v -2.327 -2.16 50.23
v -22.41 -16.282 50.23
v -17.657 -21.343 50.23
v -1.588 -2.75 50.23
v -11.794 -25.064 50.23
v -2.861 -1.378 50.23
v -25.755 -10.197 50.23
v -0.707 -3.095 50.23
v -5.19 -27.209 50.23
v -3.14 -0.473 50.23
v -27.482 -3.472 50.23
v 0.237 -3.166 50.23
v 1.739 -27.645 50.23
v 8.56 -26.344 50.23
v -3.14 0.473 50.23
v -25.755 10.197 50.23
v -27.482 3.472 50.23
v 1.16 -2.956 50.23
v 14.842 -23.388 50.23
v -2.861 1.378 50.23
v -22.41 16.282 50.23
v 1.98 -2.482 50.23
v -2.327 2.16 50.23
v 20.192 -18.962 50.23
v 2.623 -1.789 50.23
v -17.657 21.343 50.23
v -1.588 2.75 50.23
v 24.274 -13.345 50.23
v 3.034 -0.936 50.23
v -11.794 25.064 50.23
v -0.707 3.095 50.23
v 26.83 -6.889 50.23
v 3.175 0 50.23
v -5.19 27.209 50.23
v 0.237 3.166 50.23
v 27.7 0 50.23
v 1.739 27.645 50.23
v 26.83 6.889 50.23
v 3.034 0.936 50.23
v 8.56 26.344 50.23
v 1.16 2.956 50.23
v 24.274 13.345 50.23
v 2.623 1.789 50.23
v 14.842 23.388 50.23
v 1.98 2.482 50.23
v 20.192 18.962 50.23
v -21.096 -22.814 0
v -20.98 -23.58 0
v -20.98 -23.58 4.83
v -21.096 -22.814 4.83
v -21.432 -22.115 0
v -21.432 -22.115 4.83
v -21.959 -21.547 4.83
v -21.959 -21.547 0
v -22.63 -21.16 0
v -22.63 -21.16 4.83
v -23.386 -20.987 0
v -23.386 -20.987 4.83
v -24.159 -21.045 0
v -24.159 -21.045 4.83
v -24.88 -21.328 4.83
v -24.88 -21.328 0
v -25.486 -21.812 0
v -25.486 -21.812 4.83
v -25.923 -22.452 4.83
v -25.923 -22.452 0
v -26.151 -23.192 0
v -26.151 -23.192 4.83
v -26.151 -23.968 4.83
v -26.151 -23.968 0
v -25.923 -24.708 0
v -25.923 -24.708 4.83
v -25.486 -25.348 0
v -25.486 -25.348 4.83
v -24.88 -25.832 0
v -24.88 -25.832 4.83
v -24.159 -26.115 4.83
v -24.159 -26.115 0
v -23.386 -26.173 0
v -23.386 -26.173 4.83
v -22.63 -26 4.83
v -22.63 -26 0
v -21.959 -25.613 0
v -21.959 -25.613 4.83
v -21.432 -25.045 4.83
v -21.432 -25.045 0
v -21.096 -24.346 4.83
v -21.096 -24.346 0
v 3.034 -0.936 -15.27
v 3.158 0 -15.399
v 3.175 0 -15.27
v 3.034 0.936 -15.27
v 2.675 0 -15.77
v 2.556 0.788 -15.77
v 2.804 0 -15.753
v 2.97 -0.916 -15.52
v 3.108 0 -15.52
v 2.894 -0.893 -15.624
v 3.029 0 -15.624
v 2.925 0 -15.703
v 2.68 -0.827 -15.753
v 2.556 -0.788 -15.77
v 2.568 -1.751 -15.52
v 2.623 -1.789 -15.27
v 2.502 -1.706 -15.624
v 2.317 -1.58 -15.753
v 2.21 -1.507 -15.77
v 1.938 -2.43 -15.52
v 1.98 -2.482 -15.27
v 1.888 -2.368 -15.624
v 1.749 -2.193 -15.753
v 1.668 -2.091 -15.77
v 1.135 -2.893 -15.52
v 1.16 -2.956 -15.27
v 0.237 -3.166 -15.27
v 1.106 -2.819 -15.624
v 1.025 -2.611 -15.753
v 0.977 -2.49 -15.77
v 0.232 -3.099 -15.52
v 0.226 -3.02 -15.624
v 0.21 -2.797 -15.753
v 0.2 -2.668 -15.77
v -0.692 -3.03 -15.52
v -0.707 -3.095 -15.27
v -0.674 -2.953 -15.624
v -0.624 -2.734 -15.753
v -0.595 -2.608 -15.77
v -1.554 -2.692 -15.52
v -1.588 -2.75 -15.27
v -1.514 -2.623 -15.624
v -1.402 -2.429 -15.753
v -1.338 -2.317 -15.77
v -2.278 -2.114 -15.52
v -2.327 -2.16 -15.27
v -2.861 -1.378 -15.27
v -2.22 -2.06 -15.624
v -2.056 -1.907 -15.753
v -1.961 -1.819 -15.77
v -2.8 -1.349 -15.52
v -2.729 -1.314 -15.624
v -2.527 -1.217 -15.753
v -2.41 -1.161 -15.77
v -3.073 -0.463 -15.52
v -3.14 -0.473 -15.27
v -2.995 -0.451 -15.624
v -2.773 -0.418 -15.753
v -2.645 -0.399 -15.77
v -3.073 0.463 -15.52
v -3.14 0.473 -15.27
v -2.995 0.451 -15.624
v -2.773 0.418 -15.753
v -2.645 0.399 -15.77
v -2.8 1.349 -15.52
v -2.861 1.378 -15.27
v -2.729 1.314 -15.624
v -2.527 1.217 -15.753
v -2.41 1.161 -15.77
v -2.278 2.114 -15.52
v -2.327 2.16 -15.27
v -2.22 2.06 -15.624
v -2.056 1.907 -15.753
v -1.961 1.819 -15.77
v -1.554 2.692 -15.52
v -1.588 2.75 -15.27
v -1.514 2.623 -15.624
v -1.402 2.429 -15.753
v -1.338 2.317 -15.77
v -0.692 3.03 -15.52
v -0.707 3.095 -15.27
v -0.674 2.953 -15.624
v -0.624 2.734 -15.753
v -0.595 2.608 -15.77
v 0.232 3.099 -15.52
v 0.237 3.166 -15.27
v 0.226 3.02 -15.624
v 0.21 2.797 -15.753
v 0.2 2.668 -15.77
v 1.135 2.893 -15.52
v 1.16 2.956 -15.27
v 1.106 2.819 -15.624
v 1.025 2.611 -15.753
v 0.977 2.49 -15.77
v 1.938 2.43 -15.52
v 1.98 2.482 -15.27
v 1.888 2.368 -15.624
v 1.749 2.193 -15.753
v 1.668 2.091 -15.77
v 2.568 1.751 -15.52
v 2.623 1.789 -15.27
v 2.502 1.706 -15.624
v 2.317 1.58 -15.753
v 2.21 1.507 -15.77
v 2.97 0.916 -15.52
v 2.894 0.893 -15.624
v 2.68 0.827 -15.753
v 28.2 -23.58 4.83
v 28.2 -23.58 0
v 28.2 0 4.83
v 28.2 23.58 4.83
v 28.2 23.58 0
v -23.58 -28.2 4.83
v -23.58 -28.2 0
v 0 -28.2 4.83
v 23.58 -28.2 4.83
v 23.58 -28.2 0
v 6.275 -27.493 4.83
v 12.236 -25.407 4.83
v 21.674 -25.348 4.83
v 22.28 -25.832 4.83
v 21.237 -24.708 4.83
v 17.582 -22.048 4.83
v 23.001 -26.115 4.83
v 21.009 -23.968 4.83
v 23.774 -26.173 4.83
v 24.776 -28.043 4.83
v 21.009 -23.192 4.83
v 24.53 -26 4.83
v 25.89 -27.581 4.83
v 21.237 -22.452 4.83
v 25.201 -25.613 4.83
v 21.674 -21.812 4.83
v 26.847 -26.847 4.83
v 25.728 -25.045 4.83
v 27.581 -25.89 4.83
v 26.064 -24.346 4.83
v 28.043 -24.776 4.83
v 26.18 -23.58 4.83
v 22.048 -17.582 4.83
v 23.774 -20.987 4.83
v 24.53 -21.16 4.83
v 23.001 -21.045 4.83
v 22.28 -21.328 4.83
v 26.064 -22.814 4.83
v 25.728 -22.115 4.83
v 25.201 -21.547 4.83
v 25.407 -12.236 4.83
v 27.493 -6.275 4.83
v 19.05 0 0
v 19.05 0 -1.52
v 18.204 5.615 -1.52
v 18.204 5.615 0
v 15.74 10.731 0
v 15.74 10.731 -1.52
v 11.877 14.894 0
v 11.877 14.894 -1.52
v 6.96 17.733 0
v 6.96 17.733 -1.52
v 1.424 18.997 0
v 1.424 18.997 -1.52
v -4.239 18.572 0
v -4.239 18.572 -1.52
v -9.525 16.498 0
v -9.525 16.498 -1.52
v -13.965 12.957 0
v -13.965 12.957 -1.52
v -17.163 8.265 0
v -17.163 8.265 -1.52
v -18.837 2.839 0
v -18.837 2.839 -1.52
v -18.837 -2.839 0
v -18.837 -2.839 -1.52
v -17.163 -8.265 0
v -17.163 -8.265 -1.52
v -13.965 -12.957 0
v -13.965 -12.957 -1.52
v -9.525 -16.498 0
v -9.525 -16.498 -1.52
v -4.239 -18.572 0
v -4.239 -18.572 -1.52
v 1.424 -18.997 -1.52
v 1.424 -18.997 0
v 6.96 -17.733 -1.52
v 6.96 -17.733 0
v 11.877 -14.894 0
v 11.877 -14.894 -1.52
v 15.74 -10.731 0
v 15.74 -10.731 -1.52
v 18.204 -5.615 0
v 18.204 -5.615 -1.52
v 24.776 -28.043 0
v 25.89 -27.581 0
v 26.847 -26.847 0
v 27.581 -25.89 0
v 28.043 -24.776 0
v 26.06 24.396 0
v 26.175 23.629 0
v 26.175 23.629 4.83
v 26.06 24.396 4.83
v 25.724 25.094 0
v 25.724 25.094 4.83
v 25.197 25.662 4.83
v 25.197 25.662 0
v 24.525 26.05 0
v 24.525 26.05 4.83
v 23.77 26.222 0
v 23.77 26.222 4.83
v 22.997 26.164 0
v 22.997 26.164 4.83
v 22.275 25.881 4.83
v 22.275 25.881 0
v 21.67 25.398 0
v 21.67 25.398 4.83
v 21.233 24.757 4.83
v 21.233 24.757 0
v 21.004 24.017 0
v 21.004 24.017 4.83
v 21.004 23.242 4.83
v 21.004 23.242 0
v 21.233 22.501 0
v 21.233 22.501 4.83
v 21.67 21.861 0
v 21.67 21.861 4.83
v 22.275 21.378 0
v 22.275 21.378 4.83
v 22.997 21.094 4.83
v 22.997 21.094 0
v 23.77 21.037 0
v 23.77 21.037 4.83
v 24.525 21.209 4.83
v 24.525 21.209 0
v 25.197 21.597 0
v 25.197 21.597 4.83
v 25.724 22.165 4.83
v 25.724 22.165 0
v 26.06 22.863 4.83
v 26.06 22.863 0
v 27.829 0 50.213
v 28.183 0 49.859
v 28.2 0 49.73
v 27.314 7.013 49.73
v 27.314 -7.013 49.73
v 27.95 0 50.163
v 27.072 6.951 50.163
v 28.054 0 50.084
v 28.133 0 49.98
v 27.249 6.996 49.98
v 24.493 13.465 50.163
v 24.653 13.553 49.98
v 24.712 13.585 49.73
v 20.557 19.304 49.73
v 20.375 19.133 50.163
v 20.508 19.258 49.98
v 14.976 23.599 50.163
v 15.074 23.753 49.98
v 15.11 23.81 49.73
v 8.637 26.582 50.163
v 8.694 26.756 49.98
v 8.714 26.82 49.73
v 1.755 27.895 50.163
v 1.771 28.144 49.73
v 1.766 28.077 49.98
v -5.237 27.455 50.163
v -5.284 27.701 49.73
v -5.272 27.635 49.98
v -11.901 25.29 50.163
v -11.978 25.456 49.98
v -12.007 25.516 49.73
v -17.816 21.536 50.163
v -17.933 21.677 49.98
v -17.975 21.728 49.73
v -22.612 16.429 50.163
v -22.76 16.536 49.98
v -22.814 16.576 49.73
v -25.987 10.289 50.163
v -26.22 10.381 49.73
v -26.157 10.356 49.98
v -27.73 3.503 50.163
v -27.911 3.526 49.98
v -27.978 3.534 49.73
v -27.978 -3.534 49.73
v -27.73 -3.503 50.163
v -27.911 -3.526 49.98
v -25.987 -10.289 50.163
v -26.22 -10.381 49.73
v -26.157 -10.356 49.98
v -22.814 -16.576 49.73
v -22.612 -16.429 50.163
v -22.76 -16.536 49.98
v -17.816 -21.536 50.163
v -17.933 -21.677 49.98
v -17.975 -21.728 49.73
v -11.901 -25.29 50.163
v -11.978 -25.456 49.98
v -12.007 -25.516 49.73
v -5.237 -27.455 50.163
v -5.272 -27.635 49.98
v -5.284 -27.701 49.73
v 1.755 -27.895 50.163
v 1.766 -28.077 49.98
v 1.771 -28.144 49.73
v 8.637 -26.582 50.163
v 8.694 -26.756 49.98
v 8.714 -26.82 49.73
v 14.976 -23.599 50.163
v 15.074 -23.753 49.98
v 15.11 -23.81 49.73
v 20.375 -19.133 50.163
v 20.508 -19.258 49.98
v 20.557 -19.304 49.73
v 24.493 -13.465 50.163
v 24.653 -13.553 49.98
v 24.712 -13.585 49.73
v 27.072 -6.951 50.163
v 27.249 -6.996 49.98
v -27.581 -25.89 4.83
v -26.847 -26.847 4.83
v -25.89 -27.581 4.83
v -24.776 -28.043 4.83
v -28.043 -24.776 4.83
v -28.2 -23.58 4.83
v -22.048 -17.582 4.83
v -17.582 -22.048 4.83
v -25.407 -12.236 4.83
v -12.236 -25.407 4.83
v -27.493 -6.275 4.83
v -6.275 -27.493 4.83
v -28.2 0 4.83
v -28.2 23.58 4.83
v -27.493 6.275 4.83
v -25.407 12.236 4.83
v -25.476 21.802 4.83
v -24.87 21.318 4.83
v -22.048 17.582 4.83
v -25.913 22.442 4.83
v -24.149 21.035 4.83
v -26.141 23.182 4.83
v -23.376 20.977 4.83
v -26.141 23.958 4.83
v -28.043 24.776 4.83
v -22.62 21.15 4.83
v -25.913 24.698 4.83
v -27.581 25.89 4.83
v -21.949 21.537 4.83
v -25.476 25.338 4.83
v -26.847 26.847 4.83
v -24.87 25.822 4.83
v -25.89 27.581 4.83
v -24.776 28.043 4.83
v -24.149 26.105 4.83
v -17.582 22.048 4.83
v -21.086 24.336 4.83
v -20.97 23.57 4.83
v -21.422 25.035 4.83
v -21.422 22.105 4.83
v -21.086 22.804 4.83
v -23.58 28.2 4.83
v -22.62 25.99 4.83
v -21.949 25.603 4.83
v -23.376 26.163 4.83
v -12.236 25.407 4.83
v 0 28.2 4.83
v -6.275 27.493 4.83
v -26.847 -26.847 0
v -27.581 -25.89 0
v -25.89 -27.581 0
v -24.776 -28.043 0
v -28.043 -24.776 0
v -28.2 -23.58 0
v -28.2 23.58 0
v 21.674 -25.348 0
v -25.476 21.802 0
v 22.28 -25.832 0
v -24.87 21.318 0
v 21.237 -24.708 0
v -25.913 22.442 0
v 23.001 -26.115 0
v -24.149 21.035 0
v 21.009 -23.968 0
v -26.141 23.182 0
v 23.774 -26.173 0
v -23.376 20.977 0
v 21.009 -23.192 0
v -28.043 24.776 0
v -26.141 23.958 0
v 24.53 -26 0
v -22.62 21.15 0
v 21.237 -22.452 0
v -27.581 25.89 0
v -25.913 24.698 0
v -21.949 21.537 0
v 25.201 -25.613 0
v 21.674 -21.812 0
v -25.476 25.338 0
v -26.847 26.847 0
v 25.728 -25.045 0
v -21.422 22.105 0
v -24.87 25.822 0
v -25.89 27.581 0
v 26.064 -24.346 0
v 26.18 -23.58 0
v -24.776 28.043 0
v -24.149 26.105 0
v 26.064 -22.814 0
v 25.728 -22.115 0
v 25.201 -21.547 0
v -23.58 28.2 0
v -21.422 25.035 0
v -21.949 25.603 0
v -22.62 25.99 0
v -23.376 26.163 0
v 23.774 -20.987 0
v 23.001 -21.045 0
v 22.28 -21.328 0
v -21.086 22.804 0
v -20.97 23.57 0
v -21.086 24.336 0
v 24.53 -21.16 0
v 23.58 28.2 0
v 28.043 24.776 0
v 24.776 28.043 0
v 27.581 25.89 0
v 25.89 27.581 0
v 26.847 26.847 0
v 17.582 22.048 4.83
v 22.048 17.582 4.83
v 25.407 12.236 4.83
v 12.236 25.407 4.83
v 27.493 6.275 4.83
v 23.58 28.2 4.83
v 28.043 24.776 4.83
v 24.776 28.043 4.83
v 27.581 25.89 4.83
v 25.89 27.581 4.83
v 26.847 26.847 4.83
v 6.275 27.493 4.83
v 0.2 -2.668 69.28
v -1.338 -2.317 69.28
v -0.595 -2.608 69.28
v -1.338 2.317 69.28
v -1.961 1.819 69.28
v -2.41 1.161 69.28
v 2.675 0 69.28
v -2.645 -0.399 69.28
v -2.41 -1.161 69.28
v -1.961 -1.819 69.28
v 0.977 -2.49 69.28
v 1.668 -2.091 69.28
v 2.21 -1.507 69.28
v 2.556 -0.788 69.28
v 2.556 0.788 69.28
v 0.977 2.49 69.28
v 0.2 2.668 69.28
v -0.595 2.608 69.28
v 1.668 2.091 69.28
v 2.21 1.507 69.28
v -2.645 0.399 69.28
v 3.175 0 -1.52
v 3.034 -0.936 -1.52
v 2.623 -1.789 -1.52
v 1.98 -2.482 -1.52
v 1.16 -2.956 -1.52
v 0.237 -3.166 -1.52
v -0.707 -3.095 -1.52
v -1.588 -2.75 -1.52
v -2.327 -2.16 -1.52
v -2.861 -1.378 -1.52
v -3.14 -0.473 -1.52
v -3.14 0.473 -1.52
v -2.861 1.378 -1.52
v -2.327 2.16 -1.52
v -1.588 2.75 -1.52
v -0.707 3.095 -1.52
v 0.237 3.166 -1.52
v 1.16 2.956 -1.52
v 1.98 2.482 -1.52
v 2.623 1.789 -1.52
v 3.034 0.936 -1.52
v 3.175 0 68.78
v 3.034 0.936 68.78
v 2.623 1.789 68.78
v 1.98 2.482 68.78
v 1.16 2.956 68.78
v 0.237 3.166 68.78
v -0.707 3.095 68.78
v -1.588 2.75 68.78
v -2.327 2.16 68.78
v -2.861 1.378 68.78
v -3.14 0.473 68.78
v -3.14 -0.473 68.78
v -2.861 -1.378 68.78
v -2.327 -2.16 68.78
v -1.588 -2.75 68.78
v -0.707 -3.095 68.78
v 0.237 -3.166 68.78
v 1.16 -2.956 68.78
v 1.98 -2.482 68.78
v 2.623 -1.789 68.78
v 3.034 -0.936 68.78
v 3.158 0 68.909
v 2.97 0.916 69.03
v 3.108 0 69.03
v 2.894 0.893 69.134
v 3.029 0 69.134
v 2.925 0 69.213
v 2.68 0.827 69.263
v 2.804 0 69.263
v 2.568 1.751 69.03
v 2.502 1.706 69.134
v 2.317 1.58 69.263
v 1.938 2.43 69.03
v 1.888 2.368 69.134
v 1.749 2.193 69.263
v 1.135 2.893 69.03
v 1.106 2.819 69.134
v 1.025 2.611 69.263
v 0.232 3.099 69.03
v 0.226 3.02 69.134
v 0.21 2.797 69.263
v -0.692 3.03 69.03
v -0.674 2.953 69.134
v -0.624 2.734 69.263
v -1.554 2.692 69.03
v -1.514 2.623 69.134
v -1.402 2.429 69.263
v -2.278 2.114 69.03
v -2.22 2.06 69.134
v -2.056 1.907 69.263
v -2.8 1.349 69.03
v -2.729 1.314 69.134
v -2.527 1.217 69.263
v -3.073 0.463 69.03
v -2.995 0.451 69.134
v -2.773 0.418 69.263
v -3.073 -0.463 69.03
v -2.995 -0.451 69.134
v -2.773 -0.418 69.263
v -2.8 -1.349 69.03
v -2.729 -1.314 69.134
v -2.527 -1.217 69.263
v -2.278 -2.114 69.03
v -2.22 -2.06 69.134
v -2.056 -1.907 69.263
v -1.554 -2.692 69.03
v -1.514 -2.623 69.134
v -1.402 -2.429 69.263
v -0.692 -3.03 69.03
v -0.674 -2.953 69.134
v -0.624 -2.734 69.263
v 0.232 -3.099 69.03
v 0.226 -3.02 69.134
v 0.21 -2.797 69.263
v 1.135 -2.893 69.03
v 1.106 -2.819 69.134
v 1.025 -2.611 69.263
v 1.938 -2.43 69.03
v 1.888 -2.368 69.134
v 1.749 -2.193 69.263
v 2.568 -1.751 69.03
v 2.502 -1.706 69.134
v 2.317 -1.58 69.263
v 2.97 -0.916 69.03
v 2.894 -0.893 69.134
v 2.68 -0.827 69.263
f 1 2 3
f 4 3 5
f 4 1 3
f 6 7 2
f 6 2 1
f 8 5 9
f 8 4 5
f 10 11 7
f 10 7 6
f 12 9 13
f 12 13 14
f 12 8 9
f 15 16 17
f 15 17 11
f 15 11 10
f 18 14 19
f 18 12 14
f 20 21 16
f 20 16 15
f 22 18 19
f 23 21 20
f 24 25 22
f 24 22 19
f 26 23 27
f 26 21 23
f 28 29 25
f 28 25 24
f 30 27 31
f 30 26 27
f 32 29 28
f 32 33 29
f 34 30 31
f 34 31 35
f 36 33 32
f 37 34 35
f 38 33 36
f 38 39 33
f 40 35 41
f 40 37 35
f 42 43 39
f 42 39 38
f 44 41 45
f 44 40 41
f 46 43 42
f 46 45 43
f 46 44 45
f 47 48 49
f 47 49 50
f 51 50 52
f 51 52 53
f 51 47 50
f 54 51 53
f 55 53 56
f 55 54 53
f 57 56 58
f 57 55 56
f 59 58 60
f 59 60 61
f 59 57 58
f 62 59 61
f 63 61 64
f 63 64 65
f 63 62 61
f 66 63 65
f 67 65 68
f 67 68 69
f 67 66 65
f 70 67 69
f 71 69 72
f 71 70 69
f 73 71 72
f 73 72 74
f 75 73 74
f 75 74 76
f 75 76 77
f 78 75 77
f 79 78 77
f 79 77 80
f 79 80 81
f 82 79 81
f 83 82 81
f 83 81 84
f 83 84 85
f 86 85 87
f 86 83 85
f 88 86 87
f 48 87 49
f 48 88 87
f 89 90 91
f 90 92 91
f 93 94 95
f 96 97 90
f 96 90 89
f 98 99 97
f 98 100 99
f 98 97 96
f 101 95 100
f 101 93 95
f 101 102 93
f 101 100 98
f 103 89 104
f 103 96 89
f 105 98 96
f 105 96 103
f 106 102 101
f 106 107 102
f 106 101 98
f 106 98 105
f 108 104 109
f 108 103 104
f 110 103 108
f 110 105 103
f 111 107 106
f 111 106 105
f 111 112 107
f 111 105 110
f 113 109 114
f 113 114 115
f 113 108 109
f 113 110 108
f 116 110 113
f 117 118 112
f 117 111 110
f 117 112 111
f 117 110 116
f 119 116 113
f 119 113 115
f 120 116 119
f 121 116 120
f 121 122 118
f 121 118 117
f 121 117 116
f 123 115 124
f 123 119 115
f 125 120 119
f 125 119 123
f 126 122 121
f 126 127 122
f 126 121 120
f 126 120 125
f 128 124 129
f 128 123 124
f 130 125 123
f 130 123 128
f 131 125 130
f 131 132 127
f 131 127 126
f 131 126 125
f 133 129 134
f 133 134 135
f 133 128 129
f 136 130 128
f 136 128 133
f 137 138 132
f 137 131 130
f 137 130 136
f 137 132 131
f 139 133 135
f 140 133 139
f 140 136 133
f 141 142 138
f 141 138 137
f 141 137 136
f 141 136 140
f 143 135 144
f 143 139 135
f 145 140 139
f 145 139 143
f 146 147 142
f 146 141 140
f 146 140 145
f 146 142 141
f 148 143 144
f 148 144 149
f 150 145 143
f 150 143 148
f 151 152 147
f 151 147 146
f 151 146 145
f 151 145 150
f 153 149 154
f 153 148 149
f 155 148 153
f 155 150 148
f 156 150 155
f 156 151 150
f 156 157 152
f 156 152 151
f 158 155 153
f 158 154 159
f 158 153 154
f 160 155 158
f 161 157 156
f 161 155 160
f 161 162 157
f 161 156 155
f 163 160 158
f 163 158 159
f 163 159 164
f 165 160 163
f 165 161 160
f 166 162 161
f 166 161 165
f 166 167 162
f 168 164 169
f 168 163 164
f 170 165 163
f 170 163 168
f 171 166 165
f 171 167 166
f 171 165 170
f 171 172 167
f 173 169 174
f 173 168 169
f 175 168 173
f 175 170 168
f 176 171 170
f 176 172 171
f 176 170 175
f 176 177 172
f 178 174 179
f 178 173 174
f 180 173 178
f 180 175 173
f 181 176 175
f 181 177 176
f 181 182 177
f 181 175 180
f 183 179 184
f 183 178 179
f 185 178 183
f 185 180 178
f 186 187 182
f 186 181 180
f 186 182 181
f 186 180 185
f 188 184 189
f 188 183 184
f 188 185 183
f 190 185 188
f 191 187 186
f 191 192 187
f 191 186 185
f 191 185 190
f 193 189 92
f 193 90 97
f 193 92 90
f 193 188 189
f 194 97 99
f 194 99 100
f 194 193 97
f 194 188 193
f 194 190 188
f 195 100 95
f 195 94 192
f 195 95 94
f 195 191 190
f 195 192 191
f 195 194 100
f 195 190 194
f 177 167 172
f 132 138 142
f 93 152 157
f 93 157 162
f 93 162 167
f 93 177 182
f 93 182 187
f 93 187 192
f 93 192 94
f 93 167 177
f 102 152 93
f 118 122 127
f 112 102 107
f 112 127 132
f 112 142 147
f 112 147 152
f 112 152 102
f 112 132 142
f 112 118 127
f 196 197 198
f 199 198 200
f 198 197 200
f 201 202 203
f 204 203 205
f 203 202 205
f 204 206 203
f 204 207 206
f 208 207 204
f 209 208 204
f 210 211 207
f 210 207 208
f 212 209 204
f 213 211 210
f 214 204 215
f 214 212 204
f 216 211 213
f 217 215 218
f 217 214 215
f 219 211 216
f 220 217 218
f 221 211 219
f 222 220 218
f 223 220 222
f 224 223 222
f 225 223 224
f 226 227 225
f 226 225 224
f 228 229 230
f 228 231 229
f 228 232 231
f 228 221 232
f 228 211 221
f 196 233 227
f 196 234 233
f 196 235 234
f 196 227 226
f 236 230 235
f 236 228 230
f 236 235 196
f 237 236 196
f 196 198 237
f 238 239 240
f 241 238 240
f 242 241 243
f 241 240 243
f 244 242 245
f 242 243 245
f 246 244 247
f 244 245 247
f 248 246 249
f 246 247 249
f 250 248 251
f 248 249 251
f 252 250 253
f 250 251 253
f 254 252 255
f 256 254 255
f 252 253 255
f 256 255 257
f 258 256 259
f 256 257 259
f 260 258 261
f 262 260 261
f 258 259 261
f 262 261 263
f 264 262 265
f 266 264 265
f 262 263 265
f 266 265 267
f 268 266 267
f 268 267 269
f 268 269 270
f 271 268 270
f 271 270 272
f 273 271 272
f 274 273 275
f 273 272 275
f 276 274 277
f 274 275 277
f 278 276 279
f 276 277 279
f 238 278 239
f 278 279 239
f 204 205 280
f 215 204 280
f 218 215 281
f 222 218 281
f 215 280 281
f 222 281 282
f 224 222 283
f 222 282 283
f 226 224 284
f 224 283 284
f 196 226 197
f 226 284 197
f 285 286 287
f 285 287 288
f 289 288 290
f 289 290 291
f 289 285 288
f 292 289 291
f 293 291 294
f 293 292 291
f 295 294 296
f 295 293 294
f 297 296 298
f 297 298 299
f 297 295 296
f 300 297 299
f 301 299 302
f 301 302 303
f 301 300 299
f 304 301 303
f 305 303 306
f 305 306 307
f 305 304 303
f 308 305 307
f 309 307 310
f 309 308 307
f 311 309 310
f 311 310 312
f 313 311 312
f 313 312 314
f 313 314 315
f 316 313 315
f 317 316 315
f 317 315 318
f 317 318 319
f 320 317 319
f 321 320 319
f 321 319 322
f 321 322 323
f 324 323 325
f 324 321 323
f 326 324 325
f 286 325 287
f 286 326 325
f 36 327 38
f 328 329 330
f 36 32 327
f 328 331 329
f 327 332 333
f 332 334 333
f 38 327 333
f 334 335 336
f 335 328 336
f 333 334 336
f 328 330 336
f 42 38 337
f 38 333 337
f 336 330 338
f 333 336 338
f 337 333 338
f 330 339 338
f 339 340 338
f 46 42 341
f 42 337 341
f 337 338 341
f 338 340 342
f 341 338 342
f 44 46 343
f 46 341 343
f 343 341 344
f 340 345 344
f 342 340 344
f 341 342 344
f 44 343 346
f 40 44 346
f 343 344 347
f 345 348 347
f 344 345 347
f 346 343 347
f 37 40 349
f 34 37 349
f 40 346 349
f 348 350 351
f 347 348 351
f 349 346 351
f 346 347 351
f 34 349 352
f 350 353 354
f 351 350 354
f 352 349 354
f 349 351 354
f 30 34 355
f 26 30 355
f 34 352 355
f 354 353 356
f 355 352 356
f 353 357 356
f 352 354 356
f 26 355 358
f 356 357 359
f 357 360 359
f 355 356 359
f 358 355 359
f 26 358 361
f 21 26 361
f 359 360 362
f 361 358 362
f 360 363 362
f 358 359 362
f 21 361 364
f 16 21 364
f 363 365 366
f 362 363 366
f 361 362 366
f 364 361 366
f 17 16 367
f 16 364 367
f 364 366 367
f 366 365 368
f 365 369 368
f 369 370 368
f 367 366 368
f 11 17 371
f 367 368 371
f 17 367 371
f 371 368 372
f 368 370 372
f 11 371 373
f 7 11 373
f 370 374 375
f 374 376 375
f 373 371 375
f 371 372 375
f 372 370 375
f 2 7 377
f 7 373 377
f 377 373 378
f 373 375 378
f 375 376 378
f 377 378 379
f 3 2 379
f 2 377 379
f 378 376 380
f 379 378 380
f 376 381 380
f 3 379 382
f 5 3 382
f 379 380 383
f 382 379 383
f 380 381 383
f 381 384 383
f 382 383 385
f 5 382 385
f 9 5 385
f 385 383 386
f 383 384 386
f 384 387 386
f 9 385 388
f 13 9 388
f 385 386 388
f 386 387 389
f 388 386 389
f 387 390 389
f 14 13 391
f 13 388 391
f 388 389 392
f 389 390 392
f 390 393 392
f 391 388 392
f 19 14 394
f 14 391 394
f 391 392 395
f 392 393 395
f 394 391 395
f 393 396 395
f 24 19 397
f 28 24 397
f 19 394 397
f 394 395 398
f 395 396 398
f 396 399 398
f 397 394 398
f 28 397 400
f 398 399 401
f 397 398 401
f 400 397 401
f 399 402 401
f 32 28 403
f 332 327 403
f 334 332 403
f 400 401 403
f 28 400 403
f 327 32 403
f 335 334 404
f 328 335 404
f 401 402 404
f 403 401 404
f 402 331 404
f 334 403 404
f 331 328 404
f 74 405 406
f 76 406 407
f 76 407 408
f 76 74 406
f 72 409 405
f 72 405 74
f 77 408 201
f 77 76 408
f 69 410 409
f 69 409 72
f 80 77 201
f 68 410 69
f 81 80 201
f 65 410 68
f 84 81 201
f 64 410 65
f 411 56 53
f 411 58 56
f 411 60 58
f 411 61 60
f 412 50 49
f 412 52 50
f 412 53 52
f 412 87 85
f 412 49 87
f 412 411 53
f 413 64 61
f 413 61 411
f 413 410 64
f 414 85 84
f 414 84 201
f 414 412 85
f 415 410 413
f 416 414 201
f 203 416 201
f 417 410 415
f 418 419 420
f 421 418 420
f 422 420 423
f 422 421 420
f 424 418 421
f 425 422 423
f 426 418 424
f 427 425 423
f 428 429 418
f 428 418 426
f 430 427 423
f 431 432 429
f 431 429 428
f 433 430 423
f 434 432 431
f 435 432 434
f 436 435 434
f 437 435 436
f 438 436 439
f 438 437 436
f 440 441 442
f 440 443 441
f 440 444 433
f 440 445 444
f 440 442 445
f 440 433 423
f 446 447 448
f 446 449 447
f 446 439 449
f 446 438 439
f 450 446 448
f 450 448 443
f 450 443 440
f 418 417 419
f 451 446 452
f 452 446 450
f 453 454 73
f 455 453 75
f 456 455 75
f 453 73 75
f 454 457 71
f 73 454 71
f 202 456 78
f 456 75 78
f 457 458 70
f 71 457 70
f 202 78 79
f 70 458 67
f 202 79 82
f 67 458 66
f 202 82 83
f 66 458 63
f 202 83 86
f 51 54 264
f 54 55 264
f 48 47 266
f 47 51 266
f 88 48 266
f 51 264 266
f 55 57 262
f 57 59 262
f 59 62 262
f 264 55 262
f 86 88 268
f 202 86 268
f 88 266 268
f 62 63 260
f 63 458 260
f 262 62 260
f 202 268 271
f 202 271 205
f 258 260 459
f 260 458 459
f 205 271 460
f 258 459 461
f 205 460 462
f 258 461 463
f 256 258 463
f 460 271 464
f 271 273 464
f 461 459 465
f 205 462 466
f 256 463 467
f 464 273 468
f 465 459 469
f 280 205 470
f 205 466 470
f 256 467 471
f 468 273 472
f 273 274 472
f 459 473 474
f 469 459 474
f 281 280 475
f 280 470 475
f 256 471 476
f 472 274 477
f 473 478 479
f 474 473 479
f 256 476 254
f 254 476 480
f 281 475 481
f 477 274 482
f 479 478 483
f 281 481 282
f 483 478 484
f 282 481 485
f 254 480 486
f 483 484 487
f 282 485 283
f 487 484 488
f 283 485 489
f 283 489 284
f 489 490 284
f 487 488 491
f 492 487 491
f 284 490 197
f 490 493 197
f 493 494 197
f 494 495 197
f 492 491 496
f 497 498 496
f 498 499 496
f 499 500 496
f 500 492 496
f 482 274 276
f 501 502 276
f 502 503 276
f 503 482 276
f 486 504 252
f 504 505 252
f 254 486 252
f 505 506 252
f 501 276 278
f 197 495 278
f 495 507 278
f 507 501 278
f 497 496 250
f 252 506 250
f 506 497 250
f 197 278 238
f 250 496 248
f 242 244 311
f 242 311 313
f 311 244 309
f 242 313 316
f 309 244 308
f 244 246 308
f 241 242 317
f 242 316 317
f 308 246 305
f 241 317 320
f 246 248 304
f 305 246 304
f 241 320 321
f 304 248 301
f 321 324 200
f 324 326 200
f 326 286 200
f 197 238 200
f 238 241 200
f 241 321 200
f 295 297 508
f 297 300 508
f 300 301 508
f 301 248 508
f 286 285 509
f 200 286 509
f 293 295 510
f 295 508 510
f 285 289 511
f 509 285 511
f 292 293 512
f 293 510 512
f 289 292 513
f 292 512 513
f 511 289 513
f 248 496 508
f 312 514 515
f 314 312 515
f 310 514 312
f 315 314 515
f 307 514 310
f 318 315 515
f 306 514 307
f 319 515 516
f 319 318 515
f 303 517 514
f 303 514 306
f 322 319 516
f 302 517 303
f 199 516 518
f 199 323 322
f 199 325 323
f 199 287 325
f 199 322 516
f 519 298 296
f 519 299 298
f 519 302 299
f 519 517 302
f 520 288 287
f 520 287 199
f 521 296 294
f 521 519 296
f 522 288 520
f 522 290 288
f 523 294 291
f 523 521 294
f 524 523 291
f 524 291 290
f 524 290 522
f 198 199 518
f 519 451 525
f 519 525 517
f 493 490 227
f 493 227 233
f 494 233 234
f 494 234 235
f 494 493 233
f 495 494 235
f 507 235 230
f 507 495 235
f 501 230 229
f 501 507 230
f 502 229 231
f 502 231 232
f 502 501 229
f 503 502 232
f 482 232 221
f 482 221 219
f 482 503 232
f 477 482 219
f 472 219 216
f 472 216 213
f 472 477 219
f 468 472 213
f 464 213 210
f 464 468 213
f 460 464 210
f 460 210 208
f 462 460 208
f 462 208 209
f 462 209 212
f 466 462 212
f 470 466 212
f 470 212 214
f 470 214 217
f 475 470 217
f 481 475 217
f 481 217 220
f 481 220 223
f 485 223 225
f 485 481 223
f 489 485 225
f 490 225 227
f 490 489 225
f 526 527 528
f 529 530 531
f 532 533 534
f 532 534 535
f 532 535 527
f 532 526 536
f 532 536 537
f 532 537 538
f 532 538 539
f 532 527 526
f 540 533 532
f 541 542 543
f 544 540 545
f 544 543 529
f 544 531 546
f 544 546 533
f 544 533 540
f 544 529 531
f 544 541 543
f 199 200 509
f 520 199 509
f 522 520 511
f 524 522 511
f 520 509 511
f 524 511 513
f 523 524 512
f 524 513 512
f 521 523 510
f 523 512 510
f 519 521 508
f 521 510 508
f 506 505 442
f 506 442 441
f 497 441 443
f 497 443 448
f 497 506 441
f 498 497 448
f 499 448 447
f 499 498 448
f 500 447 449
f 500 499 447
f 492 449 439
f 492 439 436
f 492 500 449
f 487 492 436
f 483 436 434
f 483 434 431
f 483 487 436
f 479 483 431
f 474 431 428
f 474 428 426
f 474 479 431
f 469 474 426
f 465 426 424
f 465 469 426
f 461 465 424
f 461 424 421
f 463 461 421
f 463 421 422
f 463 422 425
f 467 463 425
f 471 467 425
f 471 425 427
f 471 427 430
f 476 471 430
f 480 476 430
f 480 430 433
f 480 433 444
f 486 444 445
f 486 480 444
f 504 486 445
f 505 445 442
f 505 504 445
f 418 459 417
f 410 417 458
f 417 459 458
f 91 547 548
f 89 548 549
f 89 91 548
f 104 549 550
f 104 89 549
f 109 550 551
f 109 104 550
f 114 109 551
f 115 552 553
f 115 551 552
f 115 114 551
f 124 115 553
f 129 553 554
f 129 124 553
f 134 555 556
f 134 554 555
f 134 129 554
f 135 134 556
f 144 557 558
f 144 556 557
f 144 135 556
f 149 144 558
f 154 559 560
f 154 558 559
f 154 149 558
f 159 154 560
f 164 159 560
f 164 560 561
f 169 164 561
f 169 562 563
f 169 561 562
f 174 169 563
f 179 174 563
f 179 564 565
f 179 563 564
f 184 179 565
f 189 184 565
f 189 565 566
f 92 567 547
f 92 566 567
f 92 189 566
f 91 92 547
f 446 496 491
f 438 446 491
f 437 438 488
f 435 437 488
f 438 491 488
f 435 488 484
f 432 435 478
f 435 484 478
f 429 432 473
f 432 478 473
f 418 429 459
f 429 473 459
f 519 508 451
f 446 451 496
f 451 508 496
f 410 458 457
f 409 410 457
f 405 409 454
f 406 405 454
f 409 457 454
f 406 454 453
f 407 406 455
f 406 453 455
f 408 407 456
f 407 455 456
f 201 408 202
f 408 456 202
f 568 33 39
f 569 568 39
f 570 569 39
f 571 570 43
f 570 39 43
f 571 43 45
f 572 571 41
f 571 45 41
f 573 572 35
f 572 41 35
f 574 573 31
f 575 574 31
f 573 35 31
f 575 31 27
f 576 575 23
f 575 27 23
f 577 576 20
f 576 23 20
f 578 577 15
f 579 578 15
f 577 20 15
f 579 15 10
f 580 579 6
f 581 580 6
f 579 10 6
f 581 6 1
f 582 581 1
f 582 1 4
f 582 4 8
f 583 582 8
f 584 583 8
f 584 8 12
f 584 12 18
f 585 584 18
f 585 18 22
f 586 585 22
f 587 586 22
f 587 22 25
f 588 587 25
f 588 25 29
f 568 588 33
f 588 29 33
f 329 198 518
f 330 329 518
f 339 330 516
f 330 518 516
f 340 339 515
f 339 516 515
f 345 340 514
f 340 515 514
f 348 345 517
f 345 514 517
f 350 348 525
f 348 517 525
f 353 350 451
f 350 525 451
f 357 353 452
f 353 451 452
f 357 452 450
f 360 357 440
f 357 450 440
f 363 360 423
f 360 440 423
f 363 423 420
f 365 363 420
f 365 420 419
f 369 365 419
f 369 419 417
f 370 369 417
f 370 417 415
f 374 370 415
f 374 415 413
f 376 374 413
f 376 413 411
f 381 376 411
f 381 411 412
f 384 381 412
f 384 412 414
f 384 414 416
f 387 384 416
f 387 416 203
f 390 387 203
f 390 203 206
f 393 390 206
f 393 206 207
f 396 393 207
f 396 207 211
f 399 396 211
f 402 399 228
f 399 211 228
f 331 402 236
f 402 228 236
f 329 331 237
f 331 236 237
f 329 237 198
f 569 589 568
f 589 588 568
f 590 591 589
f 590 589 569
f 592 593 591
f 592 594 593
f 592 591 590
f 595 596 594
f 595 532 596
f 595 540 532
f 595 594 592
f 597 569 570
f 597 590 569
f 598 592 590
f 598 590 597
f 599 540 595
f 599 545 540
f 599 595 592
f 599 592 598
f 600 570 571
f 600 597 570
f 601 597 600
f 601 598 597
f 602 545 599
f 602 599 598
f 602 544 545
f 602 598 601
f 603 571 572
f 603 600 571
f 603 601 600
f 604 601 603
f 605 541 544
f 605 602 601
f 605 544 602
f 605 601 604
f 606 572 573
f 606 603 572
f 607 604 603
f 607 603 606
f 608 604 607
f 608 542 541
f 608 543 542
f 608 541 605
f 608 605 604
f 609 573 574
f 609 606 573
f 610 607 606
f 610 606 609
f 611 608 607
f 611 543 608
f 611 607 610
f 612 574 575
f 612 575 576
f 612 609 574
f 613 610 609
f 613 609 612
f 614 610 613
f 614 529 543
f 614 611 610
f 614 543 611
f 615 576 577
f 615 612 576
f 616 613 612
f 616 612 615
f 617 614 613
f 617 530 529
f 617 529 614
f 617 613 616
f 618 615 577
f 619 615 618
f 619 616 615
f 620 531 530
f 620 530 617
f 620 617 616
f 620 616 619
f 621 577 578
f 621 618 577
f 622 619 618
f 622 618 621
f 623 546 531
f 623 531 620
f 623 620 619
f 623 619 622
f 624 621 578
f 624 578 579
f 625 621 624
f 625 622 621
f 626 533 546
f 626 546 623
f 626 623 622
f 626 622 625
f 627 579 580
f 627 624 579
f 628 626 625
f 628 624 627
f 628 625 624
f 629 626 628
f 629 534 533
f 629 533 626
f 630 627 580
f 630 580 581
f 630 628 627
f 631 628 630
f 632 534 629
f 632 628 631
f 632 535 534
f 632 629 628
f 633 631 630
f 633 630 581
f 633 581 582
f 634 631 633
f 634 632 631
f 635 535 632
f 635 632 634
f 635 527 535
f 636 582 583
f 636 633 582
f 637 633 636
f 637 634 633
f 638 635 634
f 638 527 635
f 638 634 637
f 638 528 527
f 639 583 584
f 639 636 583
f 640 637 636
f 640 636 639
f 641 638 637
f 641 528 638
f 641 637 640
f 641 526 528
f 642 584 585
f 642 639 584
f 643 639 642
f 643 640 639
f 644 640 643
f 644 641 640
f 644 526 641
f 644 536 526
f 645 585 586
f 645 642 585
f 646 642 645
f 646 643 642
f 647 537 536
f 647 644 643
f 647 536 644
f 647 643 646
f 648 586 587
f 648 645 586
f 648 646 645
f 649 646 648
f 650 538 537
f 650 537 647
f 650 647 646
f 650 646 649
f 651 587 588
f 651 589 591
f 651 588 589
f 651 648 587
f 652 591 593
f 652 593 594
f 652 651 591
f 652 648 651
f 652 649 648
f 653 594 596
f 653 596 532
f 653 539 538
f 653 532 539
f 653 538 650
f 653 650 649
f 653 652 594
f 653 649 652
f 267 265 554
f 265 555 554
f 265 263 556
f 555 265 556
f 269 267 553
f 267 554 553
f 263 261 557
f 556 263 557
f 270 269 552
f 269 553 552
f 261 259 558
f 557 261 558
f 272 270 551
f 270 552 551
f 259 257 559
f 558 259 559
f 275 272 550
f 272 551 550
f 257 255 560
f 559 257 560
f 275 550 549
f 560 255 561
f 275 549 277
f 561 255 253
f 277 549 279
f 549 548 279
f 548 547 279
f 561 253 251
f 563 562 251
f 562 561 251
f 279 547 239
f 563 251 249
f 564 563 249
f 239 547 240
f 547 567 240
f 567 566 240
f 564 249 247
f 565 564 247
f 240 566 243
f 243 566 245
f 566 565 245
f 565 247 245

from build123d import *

# Parameters (mm, degrees)
ESBO_O1_R                = 2.6
ESBO_O1_R_2              = 3.175
RESSALTO_EXTRUS_O1_DEPTH = 4.83
RESSALTO_EXTRUS_O2_START = -1.52
ESBO_O2_R                = 19.05
ESBO_O2_R_2              = 3.175
RESSALTO_EXTRUS_O2_DEPTH = 1.52
ESBO_O3_R                = 28.2
RESSALTO_EXTRUS_O3_DEPTH = 45.4
RESSALTO_EXTRUS_O4_START = 20.6
ESBO_O4_R                = 3.175
RESSALTO_EXTRUS_O4_DEPTH = 20.6
FILETE1_R                = 0.5
ESBO_O5_R                = 3.175
RESSALTO_EXTRUS_O5_DEPTH = 19.05
FILETE2_R                = 0.5
FILETE3_R                = 0.5


with BuildPart() as part:
    # Esboço1 → Ressalto-extrusão1 (new body)
    with BuildSketch(Plane.XY):
        with BuildLine():
            Line((-23.58, -28.2), (23.58, -28.2))
            ThreePointArc((23.58, -28.2), (26.846833329, -26.846833329), (28.2, -23.58))
            Line((28.2, -23.58), (28.2, 23.58))
            ThreePointArc((28.2, 23.58), (26.846833329, 26.846833329), (23.58, 28.2))
            Line((23.58, 28.2), (-23.58, 28.2))
            ThreePointArc((-23.58, 28.2), (-26.846833329, 26.846833329), (-28.2, 23.58))
            Line((-28.2, 23.58), (-28.2, -23.58))
            ThreePointArc((-28.2, -23.58), (-26.846833329, -26.846833329), (-23.58, -28.2))
        make_face()
        with Locations((-23.57, 23.57)):
            Circle(ESBO_O1_R, mode=Mode.SUBTRACT)
        with Locations((23.575450692, 23.629295607)):
            Circle(ESBO_O1_R, mode=Mode.SUBTRACT)
        with Locations((23.58, -23.58)):
            Circle(ESBO_O1_R, mode=Mode.SUBTRACT)
        with Locations((-23.58, -23.58)):
            Circle(ESBO_O1_R, mode=Mode.SUBTRACT)
        Circle(ESBO_O1_R_2, mode=Mode.SUBTRACT)
    extrude(amount=RESSALTO_EXTRUS_O1_DEPTH)

    # Esboço2 → Ressalto-extrusão2 (add)
    with BuildSketch(Plane.XY.offset(RESSALTO_EXTRUS_O2_START)):
        Circle(ESBO_O2_R)
        Circle(ESBO_O2_R_2, mode=Mode.SUBTRACT)
    extrude(amount=RESSALTO_EXTRUS_O2_DEPTH)

    # Esboço3 → Ressalto-extrusão3 (add)
    with BuildSketch(Plane.XY.offset(4.83)):
        Circle(ESBO_O3_R)
    extrude(amount=RESSALTO_EXTRUS_O3_DEPTH)

    # Esboço4 → Ressalto-extrusão4 (add)
    with BuildSketch(Plane(origin=(0, 0, 4.83), x_dir=(-1, 0, 0), z_dir=(0, 0, -1)).offset(RESSALTO_EXTRUS_O4_START)):
        with Locations(Location((0, 0, 0), (0, 0, 180))):
            Circle(ESBO_O4_R)
    extrude(amount=-RESSALTO_EXTRUS_O4_DEPTH)

    # Filete1
    filete1_edges = [part.edges().sort_by_distance(p)[0] for p in [
        (-3.175, 0, -15.77),
    ]]
    fillet(filete1_edges, radius=FILETE1_R)

    # Esboço5 → Ressalto-extrusão5 (add)
    with BuildSketch(Plane.XY.offset(50.23)):
        Circle(ESBO_O5_R)
    extrude(amount=RESSALTO_EXTRUS_O5_DEPTH)

    # Filete2
    filete2_edges = [part.edges().sort_by_distance(p)[0] for p in [
        (-3.175, 0, 69.28),
    ]]
    fillet(filete2_edges, radius=FILETE2_R)

    # Filete3
    filete3_edges = [part.edges().sort_by_distance(p)[0] for p in [
        (-28.2, 0, 50.23),
    ]]
    fillet(filete3_edges, radius=FILETE3_R)


solid = part.part
